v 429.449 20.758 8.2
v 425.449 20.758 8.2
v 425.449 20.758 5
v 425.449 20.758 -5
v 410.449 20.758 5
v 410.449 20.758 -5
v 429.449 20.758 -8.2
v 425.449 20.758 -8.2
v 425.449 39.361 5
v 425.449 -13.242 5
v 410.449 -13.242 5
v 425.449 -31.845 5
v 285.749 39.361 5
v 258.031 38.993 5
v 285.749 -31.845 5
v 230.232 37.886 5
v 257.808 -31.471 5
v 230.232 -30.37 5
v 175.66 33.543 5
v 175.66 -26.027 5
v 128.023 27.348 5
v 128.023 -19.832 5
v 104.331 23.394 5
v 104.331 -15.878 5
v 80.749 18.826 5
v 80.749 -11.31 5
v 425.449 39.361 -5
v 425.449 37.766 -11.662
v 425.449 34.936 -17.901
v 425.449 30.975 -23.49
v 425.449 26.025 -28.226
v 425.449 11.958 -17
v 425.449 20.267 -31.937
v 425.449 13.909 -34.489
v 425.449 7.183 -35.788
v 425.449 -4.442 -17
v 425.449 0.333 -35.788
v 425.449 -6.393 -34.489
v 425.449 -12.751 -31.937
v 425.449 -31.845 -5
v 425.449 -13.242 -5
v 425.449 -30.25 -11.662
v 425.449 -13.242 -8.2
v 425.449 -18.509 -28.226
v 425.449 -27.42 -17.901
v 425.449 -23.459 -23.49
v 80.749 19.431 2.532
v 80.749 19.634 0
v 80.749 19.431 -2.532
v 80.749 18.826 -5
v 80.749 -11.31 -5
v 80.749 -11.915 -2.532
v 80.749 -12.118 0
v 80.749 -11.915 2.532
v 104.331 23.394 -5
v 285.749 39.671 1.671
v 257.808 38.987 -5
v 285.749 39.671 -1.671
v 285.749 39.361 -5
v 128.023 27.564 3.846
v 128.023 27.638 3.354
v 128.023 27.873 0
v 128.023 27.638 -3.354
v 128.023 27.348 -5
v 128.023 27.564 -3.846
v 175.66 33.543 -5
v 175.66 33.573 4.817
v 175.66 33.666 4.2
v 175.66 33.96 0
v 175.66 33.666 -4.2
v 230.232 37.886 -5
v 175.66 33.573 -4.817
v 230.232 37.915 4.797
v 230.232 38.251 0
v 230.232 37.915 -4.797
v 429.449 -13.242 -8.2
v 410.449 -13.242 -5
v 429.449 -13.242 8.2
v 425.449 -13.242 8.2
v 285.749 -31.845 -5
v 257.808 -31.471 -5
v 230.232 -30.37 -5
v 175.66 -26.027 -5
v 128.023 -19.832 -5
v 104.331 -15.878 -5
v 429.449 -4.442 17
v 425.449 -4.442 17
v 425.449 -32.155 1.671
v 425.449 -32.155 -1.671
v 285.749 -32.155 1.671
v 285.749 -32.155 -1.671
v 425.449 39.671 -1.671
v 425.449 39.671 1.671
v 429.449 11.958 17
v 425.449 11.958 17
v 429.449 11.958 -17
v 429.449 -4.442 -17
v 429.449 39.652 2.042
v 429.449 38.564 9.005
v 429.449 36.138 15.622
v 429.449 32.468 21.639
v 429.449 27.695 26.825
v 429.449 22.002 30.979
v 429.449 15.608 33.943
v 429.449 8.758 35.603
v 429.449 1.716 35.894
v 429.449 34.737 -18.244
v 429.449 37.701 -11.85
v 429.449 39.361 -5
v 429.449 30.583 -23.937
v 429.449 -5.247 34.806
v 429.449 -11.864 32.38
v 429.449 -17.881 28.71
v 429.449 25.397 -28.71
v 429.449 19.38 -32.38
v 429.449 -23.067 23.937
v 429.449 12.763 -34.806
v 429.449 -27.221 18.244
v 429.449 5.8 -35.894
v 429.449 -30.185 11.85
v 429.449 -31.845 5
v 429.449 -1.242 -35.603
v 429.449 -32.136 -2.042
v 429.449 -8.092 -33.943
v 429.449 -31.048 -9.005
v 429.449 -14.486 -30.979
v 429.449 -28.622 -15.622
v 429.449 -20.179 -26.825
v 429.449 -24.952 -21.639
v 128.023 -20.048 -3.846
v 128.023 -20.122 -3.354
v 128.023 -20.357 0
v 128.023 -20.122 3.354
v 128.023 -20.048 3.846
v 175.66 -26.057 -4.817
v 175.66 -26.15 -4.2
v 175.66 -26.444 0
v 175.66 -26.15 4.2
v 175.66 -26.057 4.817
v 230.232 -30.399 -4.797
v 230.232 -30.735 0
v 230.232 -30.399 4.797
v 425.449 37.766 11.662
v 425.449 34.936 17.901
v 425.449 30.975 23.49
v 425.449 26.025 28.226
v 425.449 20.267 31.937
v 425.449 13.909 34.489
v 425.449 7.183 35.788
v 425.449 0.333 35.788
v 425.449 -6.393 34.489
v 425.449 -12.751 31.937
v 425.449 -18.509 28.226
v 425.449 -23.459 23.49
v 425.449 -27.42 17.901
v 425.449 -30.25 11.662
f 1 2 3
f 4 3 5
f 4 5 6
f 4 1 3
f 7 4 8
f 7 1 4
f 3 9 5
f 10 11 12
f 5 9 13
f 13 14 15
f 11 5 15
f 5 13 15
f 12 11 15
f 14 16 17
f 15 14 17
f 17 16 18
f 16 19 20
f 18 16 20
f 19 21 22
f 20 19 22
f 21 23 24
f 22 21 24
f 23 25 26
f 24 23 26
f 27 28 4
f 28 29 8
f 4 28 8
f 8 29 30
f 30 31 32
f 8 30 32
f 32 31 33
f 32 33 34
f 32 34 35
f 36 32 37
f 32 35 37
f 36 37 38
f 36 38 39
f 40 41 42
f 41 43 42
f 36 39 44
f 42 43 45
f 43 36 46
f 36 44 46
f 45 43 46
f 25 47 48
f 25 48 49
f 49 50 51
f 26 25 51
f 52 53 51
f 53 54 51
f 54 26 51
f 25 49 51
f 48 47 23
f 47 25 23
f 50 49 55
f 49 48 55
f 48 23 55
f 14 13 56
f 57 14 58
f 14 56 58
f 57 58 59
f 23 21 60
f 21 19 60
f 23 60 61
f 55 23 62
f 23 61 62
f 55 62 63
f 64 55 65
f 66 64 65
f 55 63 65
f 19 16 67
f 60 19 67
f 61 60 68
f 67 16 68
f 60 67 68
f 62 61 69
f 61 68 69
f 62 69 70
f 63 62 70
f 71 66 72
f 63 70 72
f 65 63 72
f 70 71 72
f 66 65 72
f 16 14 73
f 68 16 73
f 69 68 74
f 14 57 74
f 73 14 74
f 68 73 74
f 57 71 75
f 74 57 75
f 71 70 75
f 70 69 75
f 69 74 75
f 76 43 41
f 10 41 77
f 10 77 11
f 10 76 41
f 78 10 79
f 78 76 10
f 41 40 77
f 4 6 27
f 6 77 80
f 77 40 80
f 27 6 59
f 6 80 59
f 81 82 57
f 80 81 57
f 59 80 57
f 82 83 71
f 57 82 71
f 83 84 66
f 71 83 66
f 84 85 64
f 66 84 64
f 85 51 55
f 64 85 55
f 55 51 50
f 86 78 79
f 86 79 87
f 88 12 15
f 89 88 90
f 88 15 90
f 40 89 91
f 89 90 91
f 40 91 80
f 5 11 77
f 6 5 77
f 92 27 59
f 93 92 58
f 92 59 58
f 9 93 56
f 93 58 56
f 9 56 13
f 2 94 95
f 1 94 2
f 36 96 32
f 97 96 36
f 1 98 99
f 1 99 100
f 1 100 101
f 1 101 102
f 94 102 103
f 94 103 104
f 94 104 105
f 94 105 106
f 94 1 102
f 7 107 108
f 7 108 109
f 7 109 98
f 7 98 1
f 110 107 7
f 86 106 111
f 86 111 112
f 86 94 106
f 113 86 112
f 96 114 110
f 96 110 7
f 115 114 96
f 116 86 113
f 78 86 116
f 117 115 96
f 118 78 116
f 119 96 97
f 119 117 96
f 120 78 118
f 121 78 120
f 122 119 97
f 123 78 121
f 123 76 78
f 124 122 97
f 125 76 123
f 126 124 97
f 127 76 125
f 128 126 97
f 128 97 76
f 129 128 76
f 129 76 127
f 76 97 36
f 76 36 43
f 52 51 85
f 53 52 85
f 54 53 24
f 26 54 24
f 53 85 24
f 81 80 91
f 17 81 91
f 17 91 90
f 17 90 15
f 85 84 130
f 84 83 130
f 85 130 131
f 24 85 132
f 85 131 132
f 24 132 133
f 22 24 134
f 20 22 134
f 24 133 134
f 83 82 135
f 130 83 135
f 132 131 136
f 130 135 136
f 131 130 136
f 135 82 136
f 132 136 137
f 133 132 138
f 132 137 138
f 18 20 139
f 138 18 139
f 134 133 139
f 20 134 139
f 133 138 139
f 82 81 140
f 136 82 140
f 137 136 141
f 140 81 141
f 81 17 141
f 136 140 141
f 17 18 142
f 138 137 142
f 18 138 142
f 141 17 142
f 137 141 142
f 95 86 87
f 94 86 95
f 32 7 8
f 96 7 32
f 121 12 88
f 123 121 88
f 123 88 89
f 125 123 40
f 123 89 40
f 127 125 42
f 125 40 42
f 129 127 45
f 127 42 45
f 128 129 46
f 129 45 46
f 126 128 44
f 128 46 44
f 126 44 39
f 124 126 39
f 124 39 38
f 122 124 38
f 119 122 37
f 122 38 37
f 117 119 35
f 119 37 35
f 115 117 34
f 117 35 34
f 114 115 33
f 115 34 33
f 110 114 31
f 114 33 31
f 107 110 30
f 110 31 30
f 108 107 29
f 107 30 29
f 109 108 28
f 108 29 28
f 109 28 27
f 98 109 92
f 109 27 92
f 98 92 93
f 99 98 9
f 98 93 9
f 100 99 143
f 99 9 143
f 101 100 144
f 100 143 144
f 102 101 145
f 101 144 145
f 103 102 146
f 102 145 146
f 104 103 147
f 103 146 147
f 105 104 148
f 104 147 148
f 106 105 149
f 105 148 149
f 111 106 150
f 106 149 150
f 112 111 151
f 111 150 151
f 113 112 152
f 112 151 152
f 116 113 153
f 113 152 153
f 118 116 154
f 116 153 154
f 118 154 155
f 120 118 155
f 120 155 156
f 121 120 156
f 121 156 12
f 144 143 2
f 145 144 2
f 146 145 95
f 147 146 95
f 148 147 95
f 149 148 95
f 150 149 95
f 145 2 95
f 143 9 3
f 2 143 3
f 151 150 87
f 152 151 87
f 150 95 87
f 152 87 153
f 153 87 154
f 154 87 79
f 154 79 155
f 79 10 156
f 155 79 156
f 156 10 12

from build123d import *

# Parameters (mm, degrees)
CUT_EXTRUDE1_DEPTH  = 212.88306668
BOSS_EXTRUDE2_DEPTH = 139.7
SKETCH9_R           = 35.95202499
BOSS_EXTRUDE3_DEPTH = 4
CUT_EXTRUDE2_DEPTH  = 4
SKETCH11_W          = 10
SKETCH11_H          = 34
CUT_EXTRUDE3_DEPTH  = 15


with BuildPart() as part:
    # Sketch3 → Revolve1 (revolve)
    with BuildSketch(Plane.XY):
        with BuildLine():
            Line((285.74876522, 39.710021262), (285.74876522, 3.757996272))
            Line((285.74876522, 3.757996272), (80.74876522, 3.757996272))
            Line((80.74876522, 3.757996272), (80.74876522, 19.634316044))
            add(Edge.make_bspline(
                [(80.74876522, 19.634316044), (82.347112552, 19.950400666), (85.636412123, 20.593859316), (92.311794173, 21.870421625), (109.164486257, 24.943674568), (127.867996046, 27.977765645), (146.633052135, 30.604670801), (163.733801994, 32.658467989), (174.004488004, 33.801497199), (184.284802392, 34.855212792), (194.57611333, 35.797171826), (204.876878825, 36.627240946), (213.466527777, 37.244314669), (220.34120026, 37.693162367), (227.218898943, 38.097179671), (233.238636081, 38.411453209), (238.400481516, 38.652791264), (242.701722554, 38.8352093), (246.145182192, 38.969923968), (249.584994627, 39.093417446), (253.03241088, 39.20568842), (256.467961578, 39.306735697), (259.924132141, 39.396558203), (263.346991762, 39.475154984), (266.82565511, 39.542525204), (270.211898057, 39.598668148), (273.756466178, 39.643583219), (276.60509147, 39.673059099), (279.43950326, 39.691306197), (281.597603414, 39.703938851), (283.942998009, 39.708617629), (285.03032454, 39.710021262), (285.74876522, 39.710021262)],
                knots=[0.322773044, 0.322773044, 0.322773044, 0.322773044, 0.322773044, 0.341563488, 0.3614269, 0.401153715, 0.520334158, 0.56006097, 0.579924379, 0.599787787, 0.639514601, 0.679241414, 0.699104823, 0.718968231, 0.738831638, 0.758695045, 0.778558452, 0.788490156, 0.798421859, 0.808353563, 0.818285267, 0.828216971, 0.838148675, 0.848080378, 0.858012082, 0.867943786, 0.87787549, 0.887807193, 0.897738897, 0.902704749, 0.9076706, 0.917602304, 0.917602304, 0.917602304, 0.917602304, 0.917602304], degree=4))
        make_face()
    revolve(axis=Axis((285.74876522, 3.757996272, 0), (-1, 0, 0)))

    # Sketch6 → Cut-Extrude1 (cut, through all)
    with BuildSketch(Plane(origin=(285.74876522, 0, 0), x_dir=(0, 0, -1), z_dir=(1, 0, 0))):
        with BuildLine():
            Line((-5, -31.844645496), (-5, 39.36063804))
            ThreePointArc((-5, 39.360638041), (-35.95202499, 3.757996272), (-5, -31.844645496))
        make_face()
        with BuildLine():
            ThreePointArc((35.95202499, 3.757996272), (27.132160123, 27.346001444), (5, 39.36063804))
            Line((5, 39.36063804), (5, -31.844645496))
            ThreePointArc((5, -31.844645496), (27.132160123, -19.830008899), (35.95202499, 3.757996272))
        make_face()
    extrude(amount=-CUT_EXTRUDE1_DEPTH, mode=Mode.SUBTRACT)

    # Sketch8 → Boss-Extrude2 (add)
    with BuildSketch(Plane(origin=(285.74876522, 0, 0), x_dir=(0, 0, -1), z_dir=(1, 0, 0))):
        with BuildLine():
            Line((5, -31.844645496), (5, 39.360638041))
            ThreePointArc((5, 39.360638041), (0, 39.710021262), (-5, 39.360638041))
            Line((-5, 39.360638041), (-5, -31.844645496))
            ThreePointArc((-5, -31.844645496), (0, -32.194028718), (5, -31.844645496))
        make_face()
    extrude(amount=BOSS_EXTRUDE2_DEPTH)

    # Sketch9 → Boss-Extrude3 (add)
    with BuildSketch(Plane(origin=(425.44876522, 0, 0), x_dir=(0, 0, -1), z_dir=(1, 0, 0))):
        with Locations(Location((0, 3.757996272, 0), (0, 0, 262.00572083))):
            Circle(SKETCH9_R)
    extrude(amount=BOSS_EXTRUDE3_DEPTH)

    # Sketch10 → Cut-Extrude2 (cut)
    with BuildSketch(Plane(origin=(429.44876522, 0, 0), x_dir=(0, 0, -1), z_dir=(1, 0, 0))):
        Polygon((-17, -4.442003728), (-17, 11.957996272), (-8.2, 20.757996272), (8.2, 20.757996272), (17, 11.957996272), (17, -4.442003728), (8.2, -13.242003728), (-8.2, -13.242003728), align=None)
    extrude(amount=-CUT_EXTRUDE2_DEPTH, mode=Mode.SUBTRACT)

    # Sketch11 → Cut-Extrude3 (cut)
    with BuildSketch(Plane(origin=(425.44876522, 0, 0), x_dir=(0, 0, -1), z_dir=(1, 0, 0))):
        with Locations((0, 3.757996272)):
            Rectangle(SKETCH11_W, SKETCH11_H)
    extrude(amount=-CUT_EXTRUDE3_DEPTH, mode=Mode.SUBTRACT)


solid = part.part
